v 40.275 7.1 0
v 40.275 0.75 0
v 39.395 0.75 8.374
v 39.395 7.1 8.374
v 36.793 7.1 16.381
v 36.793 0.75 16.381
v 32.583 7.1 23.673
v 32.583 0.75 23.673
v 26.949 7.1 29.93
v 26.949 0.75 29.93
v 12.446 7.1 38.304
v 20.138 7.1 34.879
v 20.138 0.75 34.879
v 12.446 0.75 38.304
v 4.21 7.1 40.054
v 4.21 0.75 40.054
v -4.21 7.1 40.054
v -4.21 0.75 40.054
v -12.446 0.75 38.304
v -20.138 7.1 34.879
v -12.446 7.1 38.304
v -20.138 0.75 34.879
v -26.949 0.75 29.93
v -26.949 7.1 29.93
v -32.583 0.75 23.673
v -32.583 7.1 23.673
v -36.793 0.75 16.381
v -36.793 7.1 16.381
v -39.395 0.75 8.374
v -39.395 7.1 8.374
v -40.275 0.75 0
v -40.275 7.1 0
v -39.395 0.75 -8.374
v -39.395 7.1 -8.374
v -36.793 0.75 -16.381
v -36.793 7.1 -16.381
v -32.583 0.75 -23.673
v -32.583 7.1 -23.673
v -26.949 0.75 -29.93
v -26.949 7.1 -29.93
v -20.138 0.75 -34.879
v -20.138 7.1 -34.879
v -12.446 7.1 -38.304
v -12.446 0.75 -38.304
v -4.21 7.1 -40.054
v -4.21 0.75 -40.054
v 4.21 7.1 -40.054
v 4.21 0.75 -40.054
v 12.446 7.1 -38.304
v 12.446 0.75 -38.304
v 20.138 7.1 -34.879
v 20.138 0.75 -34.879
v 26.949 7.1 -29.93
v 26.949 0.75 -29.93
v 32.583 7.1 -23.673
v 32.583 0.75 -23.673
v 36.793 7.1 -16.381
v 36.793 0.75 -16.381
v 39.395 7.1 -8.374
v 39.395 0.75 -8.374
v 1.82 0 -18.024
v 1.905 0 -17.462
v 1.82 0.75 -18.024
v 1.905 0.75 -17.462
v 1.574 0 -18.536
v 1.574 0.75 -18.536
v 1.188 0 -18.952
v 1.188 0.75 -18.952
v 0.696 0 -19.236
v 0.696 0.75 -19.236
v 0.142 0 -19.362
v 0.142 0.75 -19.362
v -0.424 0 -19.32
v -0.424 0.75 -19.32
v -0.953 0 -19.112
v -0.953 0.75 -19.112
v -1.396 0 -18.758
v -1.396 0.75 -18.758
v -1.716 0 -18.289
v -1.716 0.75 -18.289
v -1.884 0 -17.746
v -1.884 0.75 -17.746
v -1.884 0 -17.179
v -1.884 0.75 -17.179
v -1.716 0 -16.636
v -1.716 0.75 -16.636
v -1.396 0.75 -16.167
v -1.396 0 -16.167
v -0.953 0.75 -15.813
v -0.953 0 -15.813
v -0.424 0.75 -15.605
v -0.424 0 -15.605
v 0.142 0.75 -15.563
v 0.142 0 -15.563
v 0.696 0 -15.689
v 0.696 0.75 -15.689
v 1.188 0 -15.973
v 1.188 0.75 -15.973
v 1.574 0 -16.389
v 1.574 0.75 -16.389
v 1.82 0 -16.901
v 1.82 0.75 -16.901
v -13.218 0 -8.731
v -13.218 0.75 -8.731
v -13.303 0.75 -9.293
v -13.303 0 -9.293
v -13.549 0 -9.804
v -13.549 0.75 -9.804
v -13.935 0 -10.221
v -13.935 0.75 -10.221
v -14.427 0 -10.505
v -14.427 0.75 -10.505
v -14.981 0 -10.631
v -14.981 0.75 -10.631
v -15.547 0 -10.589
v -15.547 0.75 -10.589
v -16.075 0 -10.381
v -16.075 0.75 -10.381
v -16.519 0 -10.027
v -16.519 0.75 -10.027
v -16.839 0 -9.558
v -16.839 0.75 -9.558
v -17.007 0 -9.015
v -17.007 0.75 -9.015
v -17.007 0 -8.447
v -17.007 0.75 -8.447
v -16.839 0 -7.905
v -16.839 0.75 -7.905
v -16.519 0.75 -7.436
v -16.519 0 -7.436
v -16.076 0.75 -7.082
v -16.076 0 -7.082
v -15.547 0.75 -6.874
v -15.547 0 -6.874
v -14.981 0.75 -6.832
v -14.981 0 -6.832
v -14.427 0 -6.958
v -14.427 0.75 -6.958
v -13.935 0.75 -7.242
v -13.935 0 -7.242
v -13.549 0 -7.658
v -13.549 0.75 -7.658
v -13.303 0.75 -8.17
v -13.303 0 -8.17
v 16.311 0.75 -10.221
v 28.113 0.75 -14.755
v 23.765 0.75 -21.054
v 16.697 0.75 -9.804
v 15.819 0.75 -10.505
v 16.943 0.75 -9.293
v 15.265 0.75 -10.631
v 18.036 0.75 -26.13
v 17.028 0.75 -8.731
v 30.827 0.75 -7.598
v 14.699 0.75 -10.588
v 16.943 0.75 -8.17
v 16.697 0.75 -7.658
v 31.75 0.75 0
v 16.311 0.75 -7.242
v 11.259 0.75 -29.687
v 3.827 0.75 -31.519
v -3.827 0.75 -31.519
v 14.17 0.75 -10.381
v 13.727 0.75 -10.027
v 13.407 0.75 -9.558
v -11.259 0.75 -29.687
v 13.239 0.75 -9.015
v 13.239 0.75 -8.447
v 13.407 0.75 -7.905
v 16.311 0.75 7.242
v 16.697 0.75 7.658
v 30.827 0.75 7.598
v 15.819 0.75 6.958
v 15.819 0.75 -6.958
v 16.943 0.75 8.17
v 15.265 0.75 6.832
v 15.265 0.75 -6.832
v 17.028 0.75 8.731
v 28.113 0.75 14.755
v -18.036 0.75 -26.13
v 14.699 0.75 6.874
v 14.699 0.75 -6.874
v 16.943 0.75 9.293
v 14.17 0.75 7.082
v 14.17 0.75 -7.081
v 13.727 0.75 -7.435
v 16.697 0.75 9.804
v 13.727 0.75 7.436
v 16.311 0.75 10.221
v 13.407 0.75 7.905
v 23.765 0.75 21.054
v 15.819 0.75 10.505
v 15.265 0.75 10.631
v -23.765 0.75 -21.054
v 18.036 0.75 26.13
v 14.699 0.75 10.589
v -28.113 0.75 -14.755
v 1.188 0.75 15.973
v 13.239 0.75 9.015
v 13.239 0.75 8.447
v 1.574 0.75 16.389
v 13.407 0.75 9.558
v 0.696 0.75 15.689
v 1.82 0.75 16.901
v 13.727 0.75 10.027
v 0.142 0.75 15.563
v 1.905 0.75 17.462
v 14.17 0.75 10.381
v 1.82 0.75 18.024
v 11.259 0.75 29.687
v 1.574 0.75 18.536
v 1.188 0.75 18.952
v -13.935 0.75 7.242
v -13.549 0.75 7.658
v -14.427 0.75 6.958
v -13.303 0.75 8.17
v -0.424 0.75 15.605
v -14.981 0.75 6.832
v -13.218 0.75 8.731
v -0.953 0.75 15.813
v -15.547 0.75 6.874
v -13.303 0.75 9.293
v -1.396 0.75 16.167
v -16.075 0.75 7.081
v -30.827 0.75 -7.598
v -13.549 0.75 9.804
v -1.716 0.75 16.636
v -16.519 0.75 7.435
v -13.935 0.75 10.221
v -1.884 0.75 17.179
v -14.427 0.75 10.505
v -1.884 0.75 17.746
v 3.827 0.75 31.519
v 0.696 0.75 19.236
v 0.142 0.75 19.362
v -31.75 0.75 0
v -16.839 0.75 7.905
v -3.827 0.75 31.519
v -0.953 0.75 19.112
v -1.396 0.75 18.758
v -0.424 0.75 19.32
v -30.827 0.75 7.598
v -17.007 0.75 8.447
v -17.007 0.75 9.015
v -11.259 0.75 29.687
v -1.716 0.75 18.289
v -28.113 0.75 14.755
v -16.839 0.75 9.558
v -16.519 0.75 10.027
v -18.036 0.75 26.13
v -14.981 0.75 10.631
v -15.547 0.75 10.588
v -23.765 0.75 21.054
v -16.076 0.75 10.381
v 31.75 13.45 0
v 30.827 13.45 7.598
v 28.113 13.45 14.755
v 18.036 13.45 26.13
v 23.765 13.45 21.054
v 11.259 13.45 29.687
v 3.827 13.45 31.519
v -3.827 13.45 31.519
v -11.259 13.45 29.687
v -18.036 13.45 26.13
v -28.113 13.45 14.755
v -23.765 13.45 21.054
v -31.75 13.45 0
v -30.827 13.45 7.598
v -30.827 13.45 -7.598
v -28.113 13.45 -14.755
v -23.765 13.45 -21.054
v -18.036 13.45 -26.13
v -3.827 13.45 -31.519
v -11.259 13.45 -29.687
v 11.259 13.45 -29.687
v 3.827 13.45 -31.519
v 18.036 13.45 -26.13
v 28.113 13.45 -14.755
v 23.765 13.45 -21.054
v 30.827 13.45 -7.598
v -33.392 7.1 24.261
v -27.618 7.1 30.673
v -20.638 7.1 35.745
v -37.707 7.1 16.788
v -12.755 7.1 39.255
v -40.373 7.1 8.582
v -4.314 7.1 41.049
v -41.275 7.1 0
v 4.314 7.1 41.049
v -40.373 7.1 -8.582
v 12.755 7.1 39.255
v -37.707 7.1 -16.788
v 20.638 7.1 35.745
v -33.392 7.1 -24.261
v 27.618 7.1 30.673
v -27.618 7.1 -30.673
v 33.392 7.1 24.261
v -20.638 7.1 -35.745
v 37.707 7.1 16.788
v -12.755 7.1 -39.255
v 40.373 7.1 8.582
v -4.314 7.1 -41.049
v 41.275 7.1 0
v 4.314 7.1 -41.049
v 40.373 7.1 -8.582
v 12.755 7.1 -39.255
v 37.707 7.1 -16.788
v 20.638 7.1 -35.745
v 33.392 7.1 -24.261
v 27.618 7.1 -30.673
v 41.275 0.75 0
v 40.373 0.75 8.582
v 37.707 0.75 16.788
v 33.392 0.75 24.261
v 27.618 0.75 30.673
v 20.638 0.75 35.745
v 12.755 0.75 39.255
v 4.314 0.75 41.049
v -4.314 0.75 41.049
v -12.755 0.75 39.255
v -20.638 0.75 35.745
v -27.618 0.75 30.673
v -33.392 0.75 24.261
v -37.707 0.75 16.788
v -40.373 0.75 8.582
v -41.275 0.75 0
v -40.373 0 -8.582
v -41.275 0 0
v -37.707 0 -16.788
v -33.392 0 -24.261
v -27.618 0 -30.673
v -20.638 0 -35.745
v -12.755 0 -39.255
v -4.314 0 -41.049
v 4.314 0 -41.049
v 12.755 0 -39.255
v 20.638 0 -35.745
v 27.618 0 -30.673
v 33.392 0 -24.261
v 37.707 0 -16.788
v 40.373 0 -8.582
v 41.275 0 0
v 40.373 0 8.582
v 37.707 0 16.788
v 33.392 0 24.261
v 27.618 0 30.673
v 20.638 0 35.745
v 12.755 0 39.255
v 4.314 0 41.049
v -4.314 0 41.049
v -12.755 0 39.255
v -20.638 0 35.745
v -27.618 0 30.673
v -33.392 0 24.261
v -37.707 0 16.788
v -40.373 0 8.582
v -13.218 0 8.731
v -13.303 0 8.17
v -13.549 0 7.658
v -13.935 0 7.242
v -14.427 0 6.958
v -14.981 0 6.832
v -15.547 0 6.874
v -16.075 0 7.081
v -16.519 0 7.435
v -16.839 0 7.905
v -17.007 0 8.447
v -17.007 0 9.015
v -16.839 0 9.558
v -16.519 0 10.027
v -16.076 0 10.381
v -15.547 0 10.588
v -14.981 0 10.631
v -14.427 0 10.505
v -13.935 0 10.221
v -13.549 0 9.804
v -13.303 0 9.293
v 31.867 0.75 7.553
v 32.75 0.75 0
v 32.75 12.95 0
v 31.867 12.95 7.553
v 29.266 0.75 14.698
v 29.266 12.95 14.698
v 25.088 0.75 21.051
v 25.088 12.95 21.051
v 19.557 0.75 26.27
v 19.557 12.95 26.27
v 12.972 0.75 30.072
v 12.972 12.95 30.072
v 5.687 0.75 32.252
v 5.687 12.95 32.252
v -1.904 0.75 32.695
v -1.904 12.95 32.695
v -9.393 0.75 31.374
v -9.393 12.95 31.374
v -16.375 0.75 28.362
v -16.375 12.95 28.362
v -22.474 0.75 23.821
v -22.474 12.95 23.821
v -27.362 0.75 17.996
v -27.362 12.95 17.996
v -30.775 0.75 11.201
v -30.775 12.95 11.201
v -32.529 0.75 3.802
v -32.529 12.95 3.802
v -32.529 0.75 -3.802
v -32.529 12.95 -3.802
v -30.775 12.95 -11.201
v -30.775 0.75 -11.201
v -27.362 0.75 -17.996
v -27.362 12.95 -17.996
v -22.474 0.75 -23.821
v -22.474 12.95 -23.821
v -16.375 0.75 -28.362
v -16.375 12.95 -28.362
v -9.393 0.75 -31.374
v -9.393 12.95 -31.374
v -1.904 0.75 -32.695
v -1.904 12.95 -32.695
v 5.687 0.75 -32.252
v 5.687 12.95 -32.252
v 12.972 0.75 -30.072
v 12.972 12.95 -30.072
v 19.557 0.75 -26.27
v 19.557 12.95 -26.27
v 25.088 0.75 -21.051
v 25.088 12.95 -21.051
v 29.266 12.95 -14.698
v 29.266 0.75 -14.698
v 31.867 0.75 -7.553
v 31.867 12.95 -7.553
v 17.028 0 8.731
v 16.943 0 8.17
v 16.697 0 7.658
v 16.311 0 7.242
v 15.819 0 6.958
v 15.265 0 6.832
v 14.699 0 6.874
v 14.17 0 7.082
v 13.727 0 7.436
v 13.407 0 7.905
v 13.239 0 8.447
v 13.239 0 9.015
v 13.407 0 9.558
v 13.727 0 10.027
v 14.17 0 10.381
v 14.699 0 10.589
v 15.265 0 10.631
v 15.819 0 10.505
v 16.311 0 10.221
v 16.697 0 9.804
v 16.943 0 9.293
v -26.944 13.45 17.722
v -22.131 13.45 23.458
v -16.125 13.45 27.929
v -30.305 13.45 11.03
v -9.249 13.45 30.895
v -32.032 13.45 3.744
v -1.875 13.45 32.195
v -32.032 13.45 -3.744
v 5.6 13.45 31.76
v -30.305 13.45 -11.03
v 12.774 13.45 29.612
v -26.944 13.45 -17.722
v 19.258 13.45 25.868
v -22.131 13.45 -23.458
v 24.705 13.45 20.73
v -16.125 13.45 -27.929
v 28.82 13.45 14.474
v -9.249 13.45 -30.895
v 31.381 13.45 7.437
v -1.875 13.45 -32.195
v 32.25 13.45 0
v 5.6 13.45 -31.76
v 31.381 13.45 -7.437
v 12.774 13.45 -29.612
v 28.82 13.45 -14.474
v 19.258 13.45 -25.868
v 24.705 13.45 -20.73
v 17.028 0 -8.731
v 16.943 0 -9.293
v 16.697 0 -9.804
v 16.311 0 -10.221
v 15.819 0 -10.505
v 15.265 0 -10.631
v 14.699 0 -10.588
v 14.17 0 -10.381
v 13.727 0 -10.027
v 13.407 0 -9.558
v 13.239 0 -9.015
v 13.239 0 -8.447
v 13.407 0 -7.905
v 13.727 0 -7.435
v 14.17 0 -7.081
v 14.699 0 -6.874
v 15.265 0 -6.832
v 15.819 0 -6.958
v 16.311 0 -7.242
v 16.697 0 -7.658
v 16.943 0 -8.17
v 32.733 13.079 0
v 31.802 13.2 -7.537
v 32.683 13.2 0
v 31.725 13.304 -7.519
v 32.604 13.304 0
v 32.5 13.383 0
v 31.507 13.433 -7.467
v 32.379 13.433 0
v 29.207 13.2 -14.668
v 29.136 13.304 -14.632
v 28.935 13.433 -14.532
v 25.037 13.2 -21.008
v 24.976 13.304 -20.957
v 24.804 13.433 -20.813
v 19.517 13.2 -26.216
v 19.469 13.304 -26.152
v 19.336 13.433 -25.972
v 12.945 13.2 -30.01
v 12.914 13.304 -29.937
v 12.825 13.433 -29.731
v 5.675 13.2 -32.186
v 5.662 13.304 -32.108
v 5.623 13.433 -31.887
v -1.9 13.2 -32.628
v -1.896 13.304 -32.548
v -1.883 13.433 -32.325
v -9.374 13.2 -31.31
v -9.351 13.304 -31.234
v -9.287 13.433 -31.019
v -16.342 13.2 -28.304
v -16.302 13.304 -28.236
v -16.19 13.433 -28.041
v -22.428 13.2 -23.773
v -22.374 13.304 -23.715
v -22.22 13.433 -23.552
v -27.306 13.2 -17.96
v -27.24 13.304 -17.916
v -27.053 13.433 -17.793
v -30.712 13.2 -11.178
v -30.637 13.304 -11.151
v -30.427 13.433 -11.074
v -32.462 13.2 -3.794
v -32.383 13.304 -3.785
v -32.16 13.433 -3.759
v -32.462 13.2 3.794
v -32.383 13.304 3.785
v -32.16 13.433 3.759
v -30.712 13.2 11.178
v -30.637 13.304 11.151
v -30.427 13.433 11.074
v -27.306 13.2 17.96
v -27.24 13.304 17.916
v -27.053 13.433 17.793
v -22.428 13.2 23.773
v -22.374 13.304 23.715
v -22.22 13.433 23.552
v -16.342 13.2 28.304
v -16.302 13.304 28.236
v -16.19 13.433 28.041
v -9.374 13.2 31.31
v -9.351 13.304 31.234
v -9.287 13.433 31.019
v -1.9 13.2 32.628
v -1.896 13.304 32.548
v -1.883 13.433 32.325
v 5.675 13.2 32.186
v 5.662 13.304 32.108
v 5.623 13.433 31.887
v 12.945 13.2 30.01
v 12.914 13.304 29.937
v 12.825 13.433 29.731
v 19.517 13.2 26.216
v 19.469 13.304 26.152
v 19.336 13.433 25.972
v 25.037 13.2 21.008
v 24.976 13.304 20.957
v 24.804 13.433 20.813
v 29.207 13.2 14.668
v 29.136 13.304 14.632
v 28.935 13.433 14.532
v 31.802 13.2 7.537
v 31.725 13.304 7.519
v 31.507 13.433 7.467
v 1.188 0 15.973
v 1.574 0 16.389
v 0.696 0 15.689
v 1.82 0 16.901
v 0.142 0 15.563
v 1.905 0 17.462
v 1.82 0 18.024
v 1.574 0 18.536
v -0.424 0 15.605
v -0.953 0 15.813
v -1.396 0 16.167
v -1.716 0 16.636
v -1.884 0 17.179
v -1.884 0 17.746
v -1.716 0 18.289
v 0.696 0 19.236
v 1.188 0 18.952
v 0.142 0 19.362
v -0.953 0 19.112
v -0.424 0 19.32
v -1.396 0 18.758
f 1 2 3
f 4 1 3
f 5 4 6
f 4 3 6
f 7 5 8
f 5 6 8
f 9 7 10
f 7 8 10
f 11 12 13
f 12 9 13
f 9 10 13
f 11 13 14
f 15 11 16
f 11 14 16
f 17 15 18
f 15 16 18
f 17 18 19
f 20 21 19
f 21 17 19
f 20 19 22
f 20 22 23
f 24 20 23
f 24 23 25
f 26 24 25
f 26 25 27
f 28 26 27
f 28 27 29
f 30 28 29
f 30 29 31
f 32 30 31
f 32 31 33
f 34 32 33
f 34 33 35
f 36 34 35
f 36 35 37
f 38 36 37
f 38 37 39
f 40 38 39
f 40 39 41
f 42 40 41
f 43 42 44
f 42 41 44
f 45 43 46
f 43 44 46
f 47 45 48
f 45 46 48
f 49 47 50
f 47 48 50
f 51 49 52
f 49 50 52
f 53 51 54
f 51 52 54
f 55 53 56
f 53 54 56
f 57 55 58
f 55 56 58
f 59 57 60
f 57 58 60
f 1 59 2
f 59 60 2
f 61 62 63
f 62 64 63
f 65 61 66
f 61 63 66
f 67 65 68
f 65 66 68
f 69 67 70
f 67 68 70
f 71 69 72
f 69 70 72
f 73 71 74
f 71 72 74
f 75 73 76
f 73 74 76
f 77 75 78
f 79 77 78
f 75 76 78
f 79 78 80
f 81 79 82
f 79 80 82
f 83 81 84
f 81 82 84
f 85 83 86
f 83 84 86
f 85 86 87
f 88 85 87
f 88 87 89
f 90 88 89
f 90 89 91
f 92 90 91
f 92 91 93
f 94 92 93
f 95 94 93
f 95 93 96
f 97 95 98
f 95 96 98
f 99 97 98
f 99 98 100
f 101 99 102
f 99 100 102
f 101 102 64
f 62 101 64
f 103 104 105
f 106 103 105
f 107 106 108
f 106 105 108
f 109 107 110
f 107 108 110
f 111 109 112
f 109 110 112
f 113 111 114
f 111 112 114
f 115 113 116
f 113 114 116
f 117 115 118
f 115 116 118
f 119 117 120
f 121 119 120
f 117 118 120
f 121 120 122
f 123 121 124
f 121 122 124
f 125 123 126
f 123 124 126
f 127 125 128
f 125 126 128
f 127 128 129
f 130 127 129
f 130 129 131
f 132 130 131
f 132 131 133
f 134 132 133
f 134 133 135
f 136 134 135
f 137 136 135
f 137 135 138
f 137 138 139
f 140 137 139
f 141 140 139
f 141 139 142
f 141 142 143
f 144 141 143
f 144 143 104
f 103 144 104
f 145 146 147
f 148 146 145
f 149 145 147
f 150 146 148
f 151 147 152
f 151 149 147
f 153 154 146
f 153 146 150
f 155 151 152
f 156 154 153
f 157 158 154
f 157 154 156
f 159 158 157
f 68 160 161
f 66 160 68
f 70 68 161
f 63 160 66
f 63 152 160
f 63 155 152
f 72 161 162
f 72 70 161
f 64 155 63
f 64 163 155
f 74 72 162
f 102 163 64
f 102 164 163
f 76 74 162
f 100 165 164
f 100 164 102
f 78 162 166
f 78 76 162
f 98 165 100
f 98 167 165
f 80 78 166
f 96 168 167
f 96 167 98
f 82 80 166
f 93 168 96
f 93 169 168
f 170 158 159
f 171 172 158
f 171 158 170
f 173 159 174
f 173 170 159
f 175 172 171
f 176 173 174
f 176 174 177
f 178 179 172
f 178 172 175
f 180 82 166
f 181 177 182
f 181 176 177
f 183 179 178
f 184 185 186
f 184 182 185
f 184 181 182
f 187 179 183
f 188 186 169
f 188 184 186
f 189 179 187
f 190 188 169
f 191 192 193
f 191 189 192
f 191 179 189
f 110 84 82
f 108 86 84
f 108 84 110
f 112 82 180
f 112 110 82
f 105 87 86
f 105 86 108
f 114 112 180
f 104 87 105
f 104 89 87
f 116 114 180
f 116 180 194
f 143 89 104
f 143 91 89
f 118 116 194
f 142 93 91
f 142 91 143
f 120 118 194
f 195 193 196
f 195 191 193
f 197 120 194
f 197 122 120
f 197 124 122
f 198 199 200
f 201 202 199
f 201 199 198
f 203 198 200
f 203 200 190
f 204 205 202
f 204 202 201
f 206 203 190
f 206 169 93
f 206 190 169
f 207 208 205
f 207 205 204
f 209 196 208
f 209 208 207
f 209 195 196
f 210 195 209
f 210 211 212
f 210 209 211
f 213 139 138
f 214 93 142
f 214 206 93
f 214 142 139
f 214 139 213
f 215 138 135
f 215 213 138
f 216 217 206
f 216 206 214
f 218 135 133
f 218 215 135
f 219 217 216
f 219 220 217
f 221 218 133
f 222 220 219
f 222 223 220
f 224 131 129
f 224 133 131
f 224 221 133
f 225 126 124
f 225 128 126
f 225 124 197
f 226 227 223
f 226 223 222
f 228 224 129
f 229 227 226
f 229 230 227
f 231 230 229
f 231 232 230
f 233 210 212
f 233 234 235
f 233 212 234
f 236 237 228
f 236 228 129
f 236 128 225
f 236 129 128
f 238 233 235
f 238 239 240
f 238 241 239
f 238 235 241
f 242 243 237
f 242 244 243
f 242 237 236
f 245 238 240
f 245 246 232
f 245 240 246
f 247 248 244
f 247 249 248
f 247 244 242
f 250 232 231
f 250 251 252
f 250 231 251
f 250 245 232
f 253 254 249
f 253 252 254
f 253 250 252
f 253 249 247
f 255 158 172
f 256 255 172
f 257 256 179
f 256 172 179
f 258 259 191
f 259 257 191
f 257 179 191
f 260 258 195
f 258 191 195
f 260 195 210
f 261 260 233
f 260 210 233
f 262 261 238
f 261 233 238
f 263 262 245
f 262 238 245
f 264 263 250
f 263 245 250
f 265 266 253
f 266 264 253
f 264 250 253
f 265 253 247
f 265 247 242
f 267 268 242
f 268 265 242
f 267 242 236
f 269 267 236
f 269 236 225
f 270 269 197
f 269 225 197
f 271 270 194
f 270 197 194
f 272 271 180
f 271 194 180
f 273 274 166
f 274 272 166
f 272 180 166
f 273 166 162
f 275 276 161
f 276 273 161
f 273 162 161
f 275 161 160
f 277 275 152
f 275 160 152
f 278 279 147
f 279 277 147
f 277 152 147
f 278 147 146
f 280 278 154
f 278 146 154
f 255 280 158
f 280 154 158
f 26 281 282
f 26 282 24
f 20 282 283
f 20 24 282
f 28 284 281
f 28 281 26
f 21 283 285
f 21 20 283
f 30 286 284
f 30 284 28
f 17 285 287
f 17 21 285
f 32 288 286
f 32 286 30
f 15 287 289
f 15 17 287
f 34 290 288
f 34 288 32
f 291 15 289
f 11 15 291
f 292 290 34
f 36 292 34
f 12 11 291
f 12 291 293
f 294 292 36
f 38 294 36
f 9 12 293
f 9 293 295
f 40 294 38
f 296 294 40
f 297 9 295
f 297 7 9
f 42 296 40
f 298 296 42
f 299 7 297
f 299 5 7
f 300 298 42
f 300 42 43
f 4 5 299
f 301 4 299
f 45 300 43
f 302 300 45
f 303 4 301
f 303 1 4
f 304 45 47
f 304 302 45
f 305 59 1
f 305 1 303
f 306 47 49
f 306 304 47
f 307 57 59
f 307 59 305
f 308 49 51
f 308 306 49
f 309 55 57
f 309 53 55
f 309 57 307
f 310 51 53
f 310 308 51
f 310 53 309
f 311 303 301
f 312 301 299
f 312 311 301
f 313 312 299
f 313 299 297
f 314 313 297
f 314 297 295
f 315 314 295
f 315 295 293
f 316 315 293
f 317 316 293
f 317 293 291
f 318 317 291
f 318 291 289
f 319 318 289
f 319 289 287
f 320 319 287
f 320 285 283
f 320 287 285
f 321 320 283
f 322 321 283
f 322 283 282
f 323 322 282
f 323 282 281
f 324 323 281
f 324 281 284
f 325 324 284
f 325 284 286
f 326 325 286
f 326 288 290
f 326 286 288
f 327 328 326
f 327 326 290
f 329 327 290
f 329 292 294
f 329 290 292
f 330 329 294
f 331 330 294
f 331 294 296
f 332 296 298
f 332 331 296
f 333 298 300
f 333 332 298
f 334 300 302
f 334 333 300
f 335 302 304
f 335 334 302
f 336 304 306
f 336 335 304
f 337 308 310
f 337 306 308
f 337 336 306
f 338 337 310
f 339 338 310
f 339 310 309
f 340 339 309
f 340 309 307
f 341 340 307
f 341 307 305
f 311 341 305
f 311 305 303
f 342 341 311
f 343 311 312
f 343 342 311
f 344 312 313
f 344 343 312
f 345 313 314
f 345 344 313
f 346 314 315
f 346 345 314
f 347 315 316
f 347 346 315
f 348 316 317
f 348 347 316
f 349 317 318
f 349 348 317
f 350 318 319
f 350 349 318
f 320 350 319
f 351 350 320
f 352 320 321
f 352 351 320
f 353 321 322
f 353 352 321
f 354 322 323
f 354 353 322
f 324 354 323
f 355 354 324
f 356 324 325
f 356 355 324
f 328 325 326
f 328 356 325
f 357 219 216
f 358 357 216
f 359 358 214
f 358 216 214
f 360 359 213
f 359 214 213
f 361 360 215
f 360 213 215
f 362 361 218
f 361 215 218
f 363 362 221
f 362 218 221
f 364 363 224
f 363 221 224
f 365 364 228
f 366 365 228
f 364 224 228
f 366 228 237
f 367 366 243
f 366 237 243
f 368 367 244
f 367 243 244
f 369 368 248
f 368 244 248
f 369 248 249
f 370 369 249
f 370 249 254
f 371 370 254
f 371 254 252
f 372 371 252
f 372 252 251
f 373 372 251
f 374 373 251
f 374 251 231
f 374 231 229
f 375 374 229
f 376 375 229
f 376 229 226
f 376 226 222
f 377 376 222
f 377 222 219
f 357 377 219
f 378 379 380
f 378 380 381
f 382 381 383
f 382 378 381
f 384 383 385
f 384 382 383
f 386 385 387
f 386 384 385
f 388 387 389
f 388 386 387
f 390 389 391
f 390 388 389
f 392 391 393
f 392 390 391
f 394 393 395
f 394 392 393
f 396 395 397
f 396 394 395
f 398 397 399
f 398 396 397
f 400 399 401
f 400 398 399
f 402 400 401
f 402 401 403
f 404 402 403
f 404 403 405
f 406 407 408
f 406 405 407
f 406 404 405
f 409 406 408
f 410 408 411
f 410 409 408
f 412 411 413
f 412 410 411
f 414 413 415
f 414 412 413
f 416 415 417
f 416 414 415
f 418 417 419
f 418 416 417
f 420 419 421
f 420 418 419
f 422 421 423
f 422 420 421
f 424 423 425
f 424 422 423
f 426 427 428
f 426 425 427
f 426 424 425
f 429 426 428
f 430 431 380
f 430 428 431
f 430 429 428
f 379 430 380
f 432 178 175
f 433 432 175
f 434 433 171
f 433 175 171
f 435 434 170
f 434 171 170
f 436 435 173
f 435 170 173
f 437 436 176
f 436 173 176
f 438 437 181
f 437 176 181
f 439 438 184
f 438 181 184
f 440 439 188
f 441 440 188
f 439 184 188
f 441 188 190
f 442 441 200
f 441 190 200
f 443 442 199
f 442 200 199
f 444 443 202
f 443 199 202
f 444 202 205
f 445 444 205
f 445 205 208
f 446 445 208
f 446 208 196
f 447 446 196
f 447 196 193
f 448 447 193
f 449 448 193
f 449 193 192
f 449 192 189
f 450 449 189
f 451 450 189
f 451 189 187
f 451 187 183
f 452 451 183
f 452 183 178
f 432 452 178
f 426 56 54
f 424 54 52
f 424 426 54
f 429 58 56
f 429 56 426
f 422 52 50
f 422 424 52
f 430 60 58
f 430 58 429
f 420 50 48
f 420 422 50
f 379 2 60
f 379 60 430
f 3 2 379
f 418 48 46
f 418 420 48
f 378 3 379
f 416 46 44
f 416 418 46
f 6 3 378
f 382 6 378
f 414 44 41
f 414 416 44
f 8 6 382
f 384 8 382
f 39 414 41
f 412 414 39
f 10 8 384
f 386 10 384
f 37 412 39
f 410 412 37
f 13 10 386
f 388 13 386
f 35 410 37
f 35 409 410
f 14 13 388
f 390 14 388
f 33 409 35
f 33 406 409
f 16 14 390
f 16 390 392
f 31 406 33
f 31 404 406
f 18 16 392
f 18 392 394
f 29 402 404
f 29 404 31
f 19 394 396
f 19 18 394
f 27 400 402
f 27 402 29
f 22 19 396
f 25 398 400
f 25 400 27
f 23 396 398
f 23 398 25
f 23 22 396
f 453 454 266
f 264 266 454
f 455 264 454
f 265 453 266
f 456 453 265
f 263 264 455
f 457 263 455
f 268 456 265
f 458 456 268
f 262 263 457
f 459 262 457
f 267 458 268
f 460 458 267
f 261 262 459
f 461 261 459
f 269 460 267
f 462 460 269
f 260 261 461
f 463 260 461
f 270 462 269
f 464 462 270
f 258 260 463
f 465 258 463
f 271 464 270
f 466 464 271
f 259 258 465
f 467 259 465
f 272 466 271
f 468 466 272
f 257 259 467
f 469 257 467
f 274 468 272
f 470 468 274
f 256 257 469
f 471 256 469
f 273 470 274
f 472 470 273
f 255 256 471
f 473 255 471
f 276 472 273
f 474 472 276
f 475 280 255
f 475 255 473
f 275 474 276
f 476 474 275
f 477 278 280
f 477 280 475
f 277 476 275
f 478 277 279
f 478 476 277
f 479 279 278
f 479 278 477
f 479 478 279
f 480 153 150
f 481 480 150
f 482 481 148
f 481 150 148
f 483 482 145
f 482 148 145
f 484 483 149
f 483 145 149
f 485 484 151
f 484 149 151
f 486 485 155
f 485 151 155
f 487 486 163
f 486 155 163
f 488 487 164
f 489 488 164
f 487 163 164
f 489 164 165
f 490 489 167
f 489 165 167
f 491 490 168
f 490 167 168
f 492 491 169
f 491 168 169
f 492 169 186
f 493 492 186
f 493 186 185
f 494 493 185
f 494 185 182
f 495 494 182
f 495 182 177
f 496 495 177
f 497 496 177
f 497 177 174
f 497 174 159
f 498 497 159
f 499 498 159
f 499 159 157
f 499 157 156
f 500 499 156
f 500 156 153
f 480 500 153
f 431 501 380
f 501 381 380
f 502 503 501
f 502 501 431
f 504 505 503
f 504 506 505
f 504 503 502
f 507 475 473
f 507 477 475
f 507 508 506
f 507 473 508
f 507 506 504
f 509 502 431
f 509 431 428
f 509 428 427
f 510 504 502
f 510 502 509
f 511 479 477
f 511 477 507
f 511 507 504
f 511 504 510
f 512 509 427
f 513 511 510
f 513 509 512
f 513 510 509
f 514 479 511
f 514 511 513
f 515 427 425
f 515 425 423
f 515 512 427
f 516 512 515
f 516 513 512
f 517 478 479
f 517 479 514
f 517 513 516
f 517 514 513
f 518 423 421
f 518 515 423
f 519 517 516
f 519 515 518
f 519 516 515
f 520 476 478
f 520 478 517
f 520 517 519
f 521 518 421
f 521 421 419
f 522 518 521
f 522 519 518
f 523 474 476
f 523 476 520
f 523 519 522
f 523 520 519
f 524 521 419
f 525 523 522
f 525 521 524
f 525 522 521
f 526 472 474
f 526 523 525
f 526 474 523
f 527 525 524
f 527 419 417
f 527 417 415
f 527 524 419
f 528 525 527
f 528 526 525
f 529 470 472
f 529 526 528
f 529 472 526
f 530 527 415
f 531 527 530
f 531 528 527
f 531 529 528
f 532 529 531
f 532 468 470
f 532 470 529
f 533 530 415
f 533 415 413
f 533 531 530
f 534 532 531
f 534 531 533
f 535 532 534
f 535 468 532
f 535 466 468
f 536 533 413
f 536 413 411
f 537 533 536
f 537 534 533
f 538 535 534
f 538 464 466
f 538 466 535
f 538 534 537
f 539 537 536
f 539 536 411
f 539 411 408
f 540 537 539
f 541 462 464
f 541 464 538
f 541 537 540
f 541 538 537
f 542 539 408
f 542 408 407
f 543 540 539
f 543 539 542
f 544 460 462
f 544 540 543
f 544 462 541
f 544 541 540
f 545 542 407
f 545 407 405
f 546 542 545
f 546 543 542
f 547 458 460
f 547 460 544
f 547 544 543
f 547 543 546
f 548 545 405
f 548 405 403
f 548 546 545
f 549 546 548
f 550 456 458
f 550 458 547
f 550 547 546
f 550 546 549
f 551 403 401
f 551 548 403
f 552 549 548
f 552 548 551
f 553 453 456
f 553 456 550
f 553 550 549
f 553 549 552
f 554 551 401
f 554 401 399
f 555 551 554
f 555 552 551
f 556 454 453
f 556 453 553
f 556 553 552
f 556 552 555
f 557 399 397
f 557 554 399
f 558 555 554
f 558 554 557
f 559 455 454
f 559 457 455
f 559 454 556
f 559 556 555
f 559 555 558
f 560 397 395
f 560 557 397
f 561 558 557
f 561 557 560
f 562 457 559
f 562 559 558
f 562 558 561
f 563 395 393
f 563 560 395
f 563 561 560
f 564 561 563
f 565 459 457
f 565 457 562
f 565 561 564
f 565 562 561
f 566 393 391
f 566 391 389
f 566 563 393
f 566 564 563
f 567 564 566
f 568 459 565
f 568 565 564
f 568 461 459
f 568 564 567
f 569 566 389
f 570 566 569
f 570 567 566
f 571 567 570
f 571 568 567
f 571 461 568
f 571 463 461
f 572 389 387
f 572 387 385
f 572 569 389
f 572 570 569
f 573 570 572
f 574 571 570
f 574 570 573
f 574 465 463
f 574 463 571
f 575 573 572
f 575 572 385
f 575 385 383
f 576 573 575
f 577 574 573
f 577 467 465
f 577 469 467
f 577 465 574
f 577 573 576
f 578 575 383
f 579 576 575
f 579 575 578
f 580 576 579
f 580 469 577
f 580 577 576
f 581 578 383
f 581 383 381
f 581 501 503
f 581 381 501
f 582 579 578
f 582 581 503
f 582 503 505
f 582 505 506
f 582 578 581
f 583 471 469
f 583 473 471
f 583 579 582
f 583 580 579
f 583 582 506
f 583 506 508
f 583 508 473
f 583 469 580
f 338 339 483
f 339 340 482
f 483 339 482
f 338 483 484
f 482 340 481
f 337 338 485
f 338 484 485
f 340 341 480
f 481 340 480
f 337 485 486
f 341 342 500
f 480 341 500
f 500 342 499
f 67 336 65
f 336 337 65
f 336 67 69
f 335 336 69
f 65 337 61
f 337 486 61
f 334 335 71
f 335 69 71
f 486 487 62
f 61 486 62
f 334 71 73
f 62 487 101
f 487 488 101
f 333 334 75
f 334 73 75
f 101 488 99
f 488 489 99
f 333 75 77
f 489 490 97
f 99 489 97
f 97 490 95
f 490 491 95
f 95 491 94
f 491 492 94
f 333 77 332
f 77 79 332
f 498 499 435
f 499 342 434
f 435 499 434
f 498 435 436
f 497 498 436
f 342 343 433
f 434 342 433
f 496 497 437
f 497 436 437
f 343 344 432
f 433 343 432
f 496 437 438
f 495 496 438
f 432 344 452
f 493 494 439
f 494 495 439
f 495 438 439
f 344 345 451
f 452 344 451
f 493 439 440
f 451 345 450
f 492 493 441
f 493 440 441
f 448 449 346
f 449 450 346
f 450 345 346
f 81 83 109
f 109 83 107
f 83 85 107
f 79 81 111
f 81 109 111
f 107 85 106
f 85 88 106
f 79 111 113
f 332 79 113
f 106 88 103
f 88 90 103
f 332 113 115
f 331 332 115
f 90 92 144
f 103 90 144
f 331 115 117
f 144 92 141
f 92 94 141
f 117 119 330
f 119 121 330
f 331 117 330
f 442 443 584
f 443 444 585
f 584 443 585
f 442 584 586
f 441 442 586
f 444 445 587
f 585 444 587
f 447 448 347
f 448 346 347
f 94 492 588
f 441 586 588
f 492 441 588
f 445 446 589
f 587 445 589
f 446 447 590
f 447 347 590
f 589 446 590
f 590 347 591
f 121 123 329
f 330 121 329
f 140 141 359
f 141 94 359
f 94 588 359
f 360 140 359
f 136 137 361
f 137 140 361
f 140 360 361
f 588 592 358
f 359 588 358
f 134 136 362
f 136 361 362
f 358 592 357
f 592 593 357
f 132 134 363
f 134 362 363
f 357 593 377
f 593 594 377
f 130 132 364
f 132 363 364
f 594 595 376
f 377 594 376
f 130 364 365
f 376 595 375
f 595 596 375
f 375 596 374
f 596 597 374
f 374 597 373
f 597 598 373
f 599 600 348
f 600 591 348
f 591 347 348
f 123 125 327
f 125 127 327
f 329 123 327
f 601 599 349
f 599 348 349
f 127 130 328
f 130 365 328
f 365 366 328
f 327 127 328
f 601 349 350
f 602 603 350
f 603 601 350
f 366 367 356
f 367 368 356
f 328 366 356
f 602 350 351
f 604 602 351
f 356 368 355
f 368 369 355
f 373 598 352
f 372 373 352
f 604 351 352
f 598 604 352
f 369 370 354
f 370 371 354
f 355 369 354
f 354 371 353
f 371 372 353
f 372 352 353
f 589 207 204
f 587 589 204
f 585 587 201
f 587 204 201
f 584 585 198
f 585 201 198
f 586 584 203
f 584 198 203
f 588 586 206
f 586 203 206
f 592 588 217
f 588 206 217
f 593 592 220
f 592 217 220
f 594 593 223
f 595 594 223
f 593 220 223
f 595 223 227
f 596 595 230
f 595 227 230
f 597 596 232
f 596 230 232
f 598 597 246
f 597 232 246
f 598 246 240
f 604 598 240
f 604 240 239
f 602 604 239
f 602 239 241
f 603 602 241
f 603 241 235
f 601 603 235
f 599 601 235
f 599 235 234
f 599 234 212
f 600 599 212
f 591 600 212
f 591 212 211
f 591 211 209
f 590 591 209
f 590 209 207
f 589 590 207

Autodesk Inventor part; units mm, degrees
ref_plane "YZ Plane" through (0, 0, 0) normal (1, 0, 0) x (0, 1, 0)
ref_plane "XZ Plane" through (0, 0, 0) normal (0, 1, 0) x (-1, 0, 0)
ref_plane "XY Plane" through (0, 0, 0) normal (0, 0, 1) x (1, 0, 0)
sketch "Sketch1" plane through (0, 0, 0) normal (0, 1, 0) x (-1, 0, 0)
  circle A0 centre (0, 0) radius 41.275
  dimension "d0" = 82.55
extrude "Extrusion1" add sketch "Sketch1" along normal blind 0.75
sketch "Sketch2" plane through (0, 0.75, 0) normal (0, 1, 0) x (1, 0, 0)
  circle A0 centre (0, 0) radius 31.75
  circle A1 centre (0, 0) radius 41.275 projected
  circle A2 centre (0, 0) radius 32.75
  circle A3 centre (0, 0) radius 40.275
  dimension "d3" = 63.5
  dimension "d4" = 1
  dimension "d5" = 1
extrude "Extrusion2" add sketch "Sketch2" along normal blind 12.7
fillet "Fillet1" radius 0.5 1 edges at (-32.75, 13.45, 0)
sketch "Sketch3" plane through (0, 0.75, 0) normal (0, 1, 0) x (1, 0, 0)
  circle A0 centre (0, 0) radius 17.4625 construction
  line L0 (0, 0) -> (0, -17.4625) construction
  circle A1 centre (0, -17.4625) radius 1.905
  circle A2 centre (15.123, -8.7313) radius 1.905
  circle A3 centre (15.123, 8.7312) radius 1.905
  circle A4 centre (0, 17.4625) radius 1.905
  circle A5 centre (-15.123, 8.7313) radius 1.905
  circle A6 centre (-15.123, -8.7312) radius 1.905
  dimension "d9" = 34.925
  dimension "d10" = 3.81
  dimension "d13" = 360
extrude "Extrusion3" cut sketch "Sketch3" against normal through all
thicken "Thicken1" operation cut thickness 6.35 both sides no extend neighbours no toward (0, -1, 0) faces at (-40.0621, 13.45, 7.3321)
properties part number "Mold - Wheel"
